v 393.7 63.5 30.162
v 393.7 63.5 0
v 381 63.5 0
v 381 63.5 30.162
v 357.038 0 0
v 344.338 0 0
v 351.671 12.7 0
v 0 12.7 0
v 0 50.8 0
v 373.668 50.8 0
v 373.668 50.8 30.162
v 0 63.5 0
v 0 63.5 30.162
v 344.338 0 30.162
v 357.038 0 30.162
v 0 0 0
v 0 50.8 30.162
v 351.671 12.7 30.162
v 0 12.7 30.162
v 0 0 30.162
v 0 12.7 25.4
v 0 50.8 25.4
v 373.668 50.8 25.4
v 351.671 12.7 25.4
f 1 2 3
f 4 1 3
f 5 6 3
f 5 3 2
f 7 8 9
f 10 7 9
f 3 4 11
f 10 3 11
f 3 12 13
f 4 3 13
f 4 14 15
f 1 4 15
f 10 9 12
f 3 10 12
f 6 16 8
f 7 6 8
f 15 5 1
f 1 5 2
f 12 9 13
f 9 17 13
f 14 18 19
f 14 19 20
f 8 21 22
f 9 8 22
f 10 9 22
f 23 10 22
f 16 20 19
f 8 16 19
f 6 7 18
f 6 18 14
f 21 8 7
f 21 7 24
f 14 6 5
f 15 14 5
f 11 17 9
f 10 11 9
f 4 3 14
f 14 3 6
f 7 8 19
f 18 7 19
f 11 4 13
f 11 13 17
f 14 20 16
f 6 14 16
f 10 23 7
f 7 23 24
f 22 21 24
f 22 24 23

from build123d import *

# Parameters (mm, degrees)
F1_DEPTH = 406.4
F0_W     = 38.1
F0_H     = 25.4
F2_DEPTH = 406.4
F4_DEPTH = 30.1635
F6_DEPTH = 30.1625


with BuildPart() as f1:
    # F0 (on Right) → F1 (new body)
    with BuildSketch(Plane.YZ):
        Polygon((0, 30.1625), (0, 0), (12.7, 0), (12.7, 25.4), (12.7, 30.1625), align=None)
        Polygon((50.8, 25.4), (50.8, 0), (63.5, 0), (63.5, 30.1625), (50.8, 30.1625), align=None)
    extrude(amount=F1_DEPTH)


with BuildPart() as f2:
    # F0 (on Right) → F2 (new body, through all)
    with BuildSketch(Plane.YZ):
        with Locations((31.75, 12.7)):
            Rectangle(F0_W, F0_H)
    extrude(amount=F2_DEPTH)


with BuildPart() as f4_tool:
    # F3 (on face) → F4 (new body, through all)
    with BuildSketch(Plane.XY.offset(30.1625)):
        Polygon((406.4, 0), (406.4, 63.5), (381, 63.5), (344.338258, 0), align=None)
    extrude(amount=-F4_DEPTH)


with BuildPart() as f1_1:
    add(f1.part)

    # F4: cut by f4_tool
    add(f4_tool.part, mode=Mode.SUBTRACT)


with BuildPart() as f2_1:
    add(f2.part)

    # F4: cut by f4_tool
    add(f4_tool.part, mode=Mode.SUBTRACT)


with BuildPart() as f6:
    # F5 (on Top) → F6 (new body, through all)
    with BuildSketch(Plane.XY):
        Polygon((393.7, 63.5), (381, 63.5), (344.338258, 0), (357.038258, 0), align=None)
    extrude(amount=F6_DEPTH)


solid = Compound([f1_1.part, f2_1.part, f6.part])
